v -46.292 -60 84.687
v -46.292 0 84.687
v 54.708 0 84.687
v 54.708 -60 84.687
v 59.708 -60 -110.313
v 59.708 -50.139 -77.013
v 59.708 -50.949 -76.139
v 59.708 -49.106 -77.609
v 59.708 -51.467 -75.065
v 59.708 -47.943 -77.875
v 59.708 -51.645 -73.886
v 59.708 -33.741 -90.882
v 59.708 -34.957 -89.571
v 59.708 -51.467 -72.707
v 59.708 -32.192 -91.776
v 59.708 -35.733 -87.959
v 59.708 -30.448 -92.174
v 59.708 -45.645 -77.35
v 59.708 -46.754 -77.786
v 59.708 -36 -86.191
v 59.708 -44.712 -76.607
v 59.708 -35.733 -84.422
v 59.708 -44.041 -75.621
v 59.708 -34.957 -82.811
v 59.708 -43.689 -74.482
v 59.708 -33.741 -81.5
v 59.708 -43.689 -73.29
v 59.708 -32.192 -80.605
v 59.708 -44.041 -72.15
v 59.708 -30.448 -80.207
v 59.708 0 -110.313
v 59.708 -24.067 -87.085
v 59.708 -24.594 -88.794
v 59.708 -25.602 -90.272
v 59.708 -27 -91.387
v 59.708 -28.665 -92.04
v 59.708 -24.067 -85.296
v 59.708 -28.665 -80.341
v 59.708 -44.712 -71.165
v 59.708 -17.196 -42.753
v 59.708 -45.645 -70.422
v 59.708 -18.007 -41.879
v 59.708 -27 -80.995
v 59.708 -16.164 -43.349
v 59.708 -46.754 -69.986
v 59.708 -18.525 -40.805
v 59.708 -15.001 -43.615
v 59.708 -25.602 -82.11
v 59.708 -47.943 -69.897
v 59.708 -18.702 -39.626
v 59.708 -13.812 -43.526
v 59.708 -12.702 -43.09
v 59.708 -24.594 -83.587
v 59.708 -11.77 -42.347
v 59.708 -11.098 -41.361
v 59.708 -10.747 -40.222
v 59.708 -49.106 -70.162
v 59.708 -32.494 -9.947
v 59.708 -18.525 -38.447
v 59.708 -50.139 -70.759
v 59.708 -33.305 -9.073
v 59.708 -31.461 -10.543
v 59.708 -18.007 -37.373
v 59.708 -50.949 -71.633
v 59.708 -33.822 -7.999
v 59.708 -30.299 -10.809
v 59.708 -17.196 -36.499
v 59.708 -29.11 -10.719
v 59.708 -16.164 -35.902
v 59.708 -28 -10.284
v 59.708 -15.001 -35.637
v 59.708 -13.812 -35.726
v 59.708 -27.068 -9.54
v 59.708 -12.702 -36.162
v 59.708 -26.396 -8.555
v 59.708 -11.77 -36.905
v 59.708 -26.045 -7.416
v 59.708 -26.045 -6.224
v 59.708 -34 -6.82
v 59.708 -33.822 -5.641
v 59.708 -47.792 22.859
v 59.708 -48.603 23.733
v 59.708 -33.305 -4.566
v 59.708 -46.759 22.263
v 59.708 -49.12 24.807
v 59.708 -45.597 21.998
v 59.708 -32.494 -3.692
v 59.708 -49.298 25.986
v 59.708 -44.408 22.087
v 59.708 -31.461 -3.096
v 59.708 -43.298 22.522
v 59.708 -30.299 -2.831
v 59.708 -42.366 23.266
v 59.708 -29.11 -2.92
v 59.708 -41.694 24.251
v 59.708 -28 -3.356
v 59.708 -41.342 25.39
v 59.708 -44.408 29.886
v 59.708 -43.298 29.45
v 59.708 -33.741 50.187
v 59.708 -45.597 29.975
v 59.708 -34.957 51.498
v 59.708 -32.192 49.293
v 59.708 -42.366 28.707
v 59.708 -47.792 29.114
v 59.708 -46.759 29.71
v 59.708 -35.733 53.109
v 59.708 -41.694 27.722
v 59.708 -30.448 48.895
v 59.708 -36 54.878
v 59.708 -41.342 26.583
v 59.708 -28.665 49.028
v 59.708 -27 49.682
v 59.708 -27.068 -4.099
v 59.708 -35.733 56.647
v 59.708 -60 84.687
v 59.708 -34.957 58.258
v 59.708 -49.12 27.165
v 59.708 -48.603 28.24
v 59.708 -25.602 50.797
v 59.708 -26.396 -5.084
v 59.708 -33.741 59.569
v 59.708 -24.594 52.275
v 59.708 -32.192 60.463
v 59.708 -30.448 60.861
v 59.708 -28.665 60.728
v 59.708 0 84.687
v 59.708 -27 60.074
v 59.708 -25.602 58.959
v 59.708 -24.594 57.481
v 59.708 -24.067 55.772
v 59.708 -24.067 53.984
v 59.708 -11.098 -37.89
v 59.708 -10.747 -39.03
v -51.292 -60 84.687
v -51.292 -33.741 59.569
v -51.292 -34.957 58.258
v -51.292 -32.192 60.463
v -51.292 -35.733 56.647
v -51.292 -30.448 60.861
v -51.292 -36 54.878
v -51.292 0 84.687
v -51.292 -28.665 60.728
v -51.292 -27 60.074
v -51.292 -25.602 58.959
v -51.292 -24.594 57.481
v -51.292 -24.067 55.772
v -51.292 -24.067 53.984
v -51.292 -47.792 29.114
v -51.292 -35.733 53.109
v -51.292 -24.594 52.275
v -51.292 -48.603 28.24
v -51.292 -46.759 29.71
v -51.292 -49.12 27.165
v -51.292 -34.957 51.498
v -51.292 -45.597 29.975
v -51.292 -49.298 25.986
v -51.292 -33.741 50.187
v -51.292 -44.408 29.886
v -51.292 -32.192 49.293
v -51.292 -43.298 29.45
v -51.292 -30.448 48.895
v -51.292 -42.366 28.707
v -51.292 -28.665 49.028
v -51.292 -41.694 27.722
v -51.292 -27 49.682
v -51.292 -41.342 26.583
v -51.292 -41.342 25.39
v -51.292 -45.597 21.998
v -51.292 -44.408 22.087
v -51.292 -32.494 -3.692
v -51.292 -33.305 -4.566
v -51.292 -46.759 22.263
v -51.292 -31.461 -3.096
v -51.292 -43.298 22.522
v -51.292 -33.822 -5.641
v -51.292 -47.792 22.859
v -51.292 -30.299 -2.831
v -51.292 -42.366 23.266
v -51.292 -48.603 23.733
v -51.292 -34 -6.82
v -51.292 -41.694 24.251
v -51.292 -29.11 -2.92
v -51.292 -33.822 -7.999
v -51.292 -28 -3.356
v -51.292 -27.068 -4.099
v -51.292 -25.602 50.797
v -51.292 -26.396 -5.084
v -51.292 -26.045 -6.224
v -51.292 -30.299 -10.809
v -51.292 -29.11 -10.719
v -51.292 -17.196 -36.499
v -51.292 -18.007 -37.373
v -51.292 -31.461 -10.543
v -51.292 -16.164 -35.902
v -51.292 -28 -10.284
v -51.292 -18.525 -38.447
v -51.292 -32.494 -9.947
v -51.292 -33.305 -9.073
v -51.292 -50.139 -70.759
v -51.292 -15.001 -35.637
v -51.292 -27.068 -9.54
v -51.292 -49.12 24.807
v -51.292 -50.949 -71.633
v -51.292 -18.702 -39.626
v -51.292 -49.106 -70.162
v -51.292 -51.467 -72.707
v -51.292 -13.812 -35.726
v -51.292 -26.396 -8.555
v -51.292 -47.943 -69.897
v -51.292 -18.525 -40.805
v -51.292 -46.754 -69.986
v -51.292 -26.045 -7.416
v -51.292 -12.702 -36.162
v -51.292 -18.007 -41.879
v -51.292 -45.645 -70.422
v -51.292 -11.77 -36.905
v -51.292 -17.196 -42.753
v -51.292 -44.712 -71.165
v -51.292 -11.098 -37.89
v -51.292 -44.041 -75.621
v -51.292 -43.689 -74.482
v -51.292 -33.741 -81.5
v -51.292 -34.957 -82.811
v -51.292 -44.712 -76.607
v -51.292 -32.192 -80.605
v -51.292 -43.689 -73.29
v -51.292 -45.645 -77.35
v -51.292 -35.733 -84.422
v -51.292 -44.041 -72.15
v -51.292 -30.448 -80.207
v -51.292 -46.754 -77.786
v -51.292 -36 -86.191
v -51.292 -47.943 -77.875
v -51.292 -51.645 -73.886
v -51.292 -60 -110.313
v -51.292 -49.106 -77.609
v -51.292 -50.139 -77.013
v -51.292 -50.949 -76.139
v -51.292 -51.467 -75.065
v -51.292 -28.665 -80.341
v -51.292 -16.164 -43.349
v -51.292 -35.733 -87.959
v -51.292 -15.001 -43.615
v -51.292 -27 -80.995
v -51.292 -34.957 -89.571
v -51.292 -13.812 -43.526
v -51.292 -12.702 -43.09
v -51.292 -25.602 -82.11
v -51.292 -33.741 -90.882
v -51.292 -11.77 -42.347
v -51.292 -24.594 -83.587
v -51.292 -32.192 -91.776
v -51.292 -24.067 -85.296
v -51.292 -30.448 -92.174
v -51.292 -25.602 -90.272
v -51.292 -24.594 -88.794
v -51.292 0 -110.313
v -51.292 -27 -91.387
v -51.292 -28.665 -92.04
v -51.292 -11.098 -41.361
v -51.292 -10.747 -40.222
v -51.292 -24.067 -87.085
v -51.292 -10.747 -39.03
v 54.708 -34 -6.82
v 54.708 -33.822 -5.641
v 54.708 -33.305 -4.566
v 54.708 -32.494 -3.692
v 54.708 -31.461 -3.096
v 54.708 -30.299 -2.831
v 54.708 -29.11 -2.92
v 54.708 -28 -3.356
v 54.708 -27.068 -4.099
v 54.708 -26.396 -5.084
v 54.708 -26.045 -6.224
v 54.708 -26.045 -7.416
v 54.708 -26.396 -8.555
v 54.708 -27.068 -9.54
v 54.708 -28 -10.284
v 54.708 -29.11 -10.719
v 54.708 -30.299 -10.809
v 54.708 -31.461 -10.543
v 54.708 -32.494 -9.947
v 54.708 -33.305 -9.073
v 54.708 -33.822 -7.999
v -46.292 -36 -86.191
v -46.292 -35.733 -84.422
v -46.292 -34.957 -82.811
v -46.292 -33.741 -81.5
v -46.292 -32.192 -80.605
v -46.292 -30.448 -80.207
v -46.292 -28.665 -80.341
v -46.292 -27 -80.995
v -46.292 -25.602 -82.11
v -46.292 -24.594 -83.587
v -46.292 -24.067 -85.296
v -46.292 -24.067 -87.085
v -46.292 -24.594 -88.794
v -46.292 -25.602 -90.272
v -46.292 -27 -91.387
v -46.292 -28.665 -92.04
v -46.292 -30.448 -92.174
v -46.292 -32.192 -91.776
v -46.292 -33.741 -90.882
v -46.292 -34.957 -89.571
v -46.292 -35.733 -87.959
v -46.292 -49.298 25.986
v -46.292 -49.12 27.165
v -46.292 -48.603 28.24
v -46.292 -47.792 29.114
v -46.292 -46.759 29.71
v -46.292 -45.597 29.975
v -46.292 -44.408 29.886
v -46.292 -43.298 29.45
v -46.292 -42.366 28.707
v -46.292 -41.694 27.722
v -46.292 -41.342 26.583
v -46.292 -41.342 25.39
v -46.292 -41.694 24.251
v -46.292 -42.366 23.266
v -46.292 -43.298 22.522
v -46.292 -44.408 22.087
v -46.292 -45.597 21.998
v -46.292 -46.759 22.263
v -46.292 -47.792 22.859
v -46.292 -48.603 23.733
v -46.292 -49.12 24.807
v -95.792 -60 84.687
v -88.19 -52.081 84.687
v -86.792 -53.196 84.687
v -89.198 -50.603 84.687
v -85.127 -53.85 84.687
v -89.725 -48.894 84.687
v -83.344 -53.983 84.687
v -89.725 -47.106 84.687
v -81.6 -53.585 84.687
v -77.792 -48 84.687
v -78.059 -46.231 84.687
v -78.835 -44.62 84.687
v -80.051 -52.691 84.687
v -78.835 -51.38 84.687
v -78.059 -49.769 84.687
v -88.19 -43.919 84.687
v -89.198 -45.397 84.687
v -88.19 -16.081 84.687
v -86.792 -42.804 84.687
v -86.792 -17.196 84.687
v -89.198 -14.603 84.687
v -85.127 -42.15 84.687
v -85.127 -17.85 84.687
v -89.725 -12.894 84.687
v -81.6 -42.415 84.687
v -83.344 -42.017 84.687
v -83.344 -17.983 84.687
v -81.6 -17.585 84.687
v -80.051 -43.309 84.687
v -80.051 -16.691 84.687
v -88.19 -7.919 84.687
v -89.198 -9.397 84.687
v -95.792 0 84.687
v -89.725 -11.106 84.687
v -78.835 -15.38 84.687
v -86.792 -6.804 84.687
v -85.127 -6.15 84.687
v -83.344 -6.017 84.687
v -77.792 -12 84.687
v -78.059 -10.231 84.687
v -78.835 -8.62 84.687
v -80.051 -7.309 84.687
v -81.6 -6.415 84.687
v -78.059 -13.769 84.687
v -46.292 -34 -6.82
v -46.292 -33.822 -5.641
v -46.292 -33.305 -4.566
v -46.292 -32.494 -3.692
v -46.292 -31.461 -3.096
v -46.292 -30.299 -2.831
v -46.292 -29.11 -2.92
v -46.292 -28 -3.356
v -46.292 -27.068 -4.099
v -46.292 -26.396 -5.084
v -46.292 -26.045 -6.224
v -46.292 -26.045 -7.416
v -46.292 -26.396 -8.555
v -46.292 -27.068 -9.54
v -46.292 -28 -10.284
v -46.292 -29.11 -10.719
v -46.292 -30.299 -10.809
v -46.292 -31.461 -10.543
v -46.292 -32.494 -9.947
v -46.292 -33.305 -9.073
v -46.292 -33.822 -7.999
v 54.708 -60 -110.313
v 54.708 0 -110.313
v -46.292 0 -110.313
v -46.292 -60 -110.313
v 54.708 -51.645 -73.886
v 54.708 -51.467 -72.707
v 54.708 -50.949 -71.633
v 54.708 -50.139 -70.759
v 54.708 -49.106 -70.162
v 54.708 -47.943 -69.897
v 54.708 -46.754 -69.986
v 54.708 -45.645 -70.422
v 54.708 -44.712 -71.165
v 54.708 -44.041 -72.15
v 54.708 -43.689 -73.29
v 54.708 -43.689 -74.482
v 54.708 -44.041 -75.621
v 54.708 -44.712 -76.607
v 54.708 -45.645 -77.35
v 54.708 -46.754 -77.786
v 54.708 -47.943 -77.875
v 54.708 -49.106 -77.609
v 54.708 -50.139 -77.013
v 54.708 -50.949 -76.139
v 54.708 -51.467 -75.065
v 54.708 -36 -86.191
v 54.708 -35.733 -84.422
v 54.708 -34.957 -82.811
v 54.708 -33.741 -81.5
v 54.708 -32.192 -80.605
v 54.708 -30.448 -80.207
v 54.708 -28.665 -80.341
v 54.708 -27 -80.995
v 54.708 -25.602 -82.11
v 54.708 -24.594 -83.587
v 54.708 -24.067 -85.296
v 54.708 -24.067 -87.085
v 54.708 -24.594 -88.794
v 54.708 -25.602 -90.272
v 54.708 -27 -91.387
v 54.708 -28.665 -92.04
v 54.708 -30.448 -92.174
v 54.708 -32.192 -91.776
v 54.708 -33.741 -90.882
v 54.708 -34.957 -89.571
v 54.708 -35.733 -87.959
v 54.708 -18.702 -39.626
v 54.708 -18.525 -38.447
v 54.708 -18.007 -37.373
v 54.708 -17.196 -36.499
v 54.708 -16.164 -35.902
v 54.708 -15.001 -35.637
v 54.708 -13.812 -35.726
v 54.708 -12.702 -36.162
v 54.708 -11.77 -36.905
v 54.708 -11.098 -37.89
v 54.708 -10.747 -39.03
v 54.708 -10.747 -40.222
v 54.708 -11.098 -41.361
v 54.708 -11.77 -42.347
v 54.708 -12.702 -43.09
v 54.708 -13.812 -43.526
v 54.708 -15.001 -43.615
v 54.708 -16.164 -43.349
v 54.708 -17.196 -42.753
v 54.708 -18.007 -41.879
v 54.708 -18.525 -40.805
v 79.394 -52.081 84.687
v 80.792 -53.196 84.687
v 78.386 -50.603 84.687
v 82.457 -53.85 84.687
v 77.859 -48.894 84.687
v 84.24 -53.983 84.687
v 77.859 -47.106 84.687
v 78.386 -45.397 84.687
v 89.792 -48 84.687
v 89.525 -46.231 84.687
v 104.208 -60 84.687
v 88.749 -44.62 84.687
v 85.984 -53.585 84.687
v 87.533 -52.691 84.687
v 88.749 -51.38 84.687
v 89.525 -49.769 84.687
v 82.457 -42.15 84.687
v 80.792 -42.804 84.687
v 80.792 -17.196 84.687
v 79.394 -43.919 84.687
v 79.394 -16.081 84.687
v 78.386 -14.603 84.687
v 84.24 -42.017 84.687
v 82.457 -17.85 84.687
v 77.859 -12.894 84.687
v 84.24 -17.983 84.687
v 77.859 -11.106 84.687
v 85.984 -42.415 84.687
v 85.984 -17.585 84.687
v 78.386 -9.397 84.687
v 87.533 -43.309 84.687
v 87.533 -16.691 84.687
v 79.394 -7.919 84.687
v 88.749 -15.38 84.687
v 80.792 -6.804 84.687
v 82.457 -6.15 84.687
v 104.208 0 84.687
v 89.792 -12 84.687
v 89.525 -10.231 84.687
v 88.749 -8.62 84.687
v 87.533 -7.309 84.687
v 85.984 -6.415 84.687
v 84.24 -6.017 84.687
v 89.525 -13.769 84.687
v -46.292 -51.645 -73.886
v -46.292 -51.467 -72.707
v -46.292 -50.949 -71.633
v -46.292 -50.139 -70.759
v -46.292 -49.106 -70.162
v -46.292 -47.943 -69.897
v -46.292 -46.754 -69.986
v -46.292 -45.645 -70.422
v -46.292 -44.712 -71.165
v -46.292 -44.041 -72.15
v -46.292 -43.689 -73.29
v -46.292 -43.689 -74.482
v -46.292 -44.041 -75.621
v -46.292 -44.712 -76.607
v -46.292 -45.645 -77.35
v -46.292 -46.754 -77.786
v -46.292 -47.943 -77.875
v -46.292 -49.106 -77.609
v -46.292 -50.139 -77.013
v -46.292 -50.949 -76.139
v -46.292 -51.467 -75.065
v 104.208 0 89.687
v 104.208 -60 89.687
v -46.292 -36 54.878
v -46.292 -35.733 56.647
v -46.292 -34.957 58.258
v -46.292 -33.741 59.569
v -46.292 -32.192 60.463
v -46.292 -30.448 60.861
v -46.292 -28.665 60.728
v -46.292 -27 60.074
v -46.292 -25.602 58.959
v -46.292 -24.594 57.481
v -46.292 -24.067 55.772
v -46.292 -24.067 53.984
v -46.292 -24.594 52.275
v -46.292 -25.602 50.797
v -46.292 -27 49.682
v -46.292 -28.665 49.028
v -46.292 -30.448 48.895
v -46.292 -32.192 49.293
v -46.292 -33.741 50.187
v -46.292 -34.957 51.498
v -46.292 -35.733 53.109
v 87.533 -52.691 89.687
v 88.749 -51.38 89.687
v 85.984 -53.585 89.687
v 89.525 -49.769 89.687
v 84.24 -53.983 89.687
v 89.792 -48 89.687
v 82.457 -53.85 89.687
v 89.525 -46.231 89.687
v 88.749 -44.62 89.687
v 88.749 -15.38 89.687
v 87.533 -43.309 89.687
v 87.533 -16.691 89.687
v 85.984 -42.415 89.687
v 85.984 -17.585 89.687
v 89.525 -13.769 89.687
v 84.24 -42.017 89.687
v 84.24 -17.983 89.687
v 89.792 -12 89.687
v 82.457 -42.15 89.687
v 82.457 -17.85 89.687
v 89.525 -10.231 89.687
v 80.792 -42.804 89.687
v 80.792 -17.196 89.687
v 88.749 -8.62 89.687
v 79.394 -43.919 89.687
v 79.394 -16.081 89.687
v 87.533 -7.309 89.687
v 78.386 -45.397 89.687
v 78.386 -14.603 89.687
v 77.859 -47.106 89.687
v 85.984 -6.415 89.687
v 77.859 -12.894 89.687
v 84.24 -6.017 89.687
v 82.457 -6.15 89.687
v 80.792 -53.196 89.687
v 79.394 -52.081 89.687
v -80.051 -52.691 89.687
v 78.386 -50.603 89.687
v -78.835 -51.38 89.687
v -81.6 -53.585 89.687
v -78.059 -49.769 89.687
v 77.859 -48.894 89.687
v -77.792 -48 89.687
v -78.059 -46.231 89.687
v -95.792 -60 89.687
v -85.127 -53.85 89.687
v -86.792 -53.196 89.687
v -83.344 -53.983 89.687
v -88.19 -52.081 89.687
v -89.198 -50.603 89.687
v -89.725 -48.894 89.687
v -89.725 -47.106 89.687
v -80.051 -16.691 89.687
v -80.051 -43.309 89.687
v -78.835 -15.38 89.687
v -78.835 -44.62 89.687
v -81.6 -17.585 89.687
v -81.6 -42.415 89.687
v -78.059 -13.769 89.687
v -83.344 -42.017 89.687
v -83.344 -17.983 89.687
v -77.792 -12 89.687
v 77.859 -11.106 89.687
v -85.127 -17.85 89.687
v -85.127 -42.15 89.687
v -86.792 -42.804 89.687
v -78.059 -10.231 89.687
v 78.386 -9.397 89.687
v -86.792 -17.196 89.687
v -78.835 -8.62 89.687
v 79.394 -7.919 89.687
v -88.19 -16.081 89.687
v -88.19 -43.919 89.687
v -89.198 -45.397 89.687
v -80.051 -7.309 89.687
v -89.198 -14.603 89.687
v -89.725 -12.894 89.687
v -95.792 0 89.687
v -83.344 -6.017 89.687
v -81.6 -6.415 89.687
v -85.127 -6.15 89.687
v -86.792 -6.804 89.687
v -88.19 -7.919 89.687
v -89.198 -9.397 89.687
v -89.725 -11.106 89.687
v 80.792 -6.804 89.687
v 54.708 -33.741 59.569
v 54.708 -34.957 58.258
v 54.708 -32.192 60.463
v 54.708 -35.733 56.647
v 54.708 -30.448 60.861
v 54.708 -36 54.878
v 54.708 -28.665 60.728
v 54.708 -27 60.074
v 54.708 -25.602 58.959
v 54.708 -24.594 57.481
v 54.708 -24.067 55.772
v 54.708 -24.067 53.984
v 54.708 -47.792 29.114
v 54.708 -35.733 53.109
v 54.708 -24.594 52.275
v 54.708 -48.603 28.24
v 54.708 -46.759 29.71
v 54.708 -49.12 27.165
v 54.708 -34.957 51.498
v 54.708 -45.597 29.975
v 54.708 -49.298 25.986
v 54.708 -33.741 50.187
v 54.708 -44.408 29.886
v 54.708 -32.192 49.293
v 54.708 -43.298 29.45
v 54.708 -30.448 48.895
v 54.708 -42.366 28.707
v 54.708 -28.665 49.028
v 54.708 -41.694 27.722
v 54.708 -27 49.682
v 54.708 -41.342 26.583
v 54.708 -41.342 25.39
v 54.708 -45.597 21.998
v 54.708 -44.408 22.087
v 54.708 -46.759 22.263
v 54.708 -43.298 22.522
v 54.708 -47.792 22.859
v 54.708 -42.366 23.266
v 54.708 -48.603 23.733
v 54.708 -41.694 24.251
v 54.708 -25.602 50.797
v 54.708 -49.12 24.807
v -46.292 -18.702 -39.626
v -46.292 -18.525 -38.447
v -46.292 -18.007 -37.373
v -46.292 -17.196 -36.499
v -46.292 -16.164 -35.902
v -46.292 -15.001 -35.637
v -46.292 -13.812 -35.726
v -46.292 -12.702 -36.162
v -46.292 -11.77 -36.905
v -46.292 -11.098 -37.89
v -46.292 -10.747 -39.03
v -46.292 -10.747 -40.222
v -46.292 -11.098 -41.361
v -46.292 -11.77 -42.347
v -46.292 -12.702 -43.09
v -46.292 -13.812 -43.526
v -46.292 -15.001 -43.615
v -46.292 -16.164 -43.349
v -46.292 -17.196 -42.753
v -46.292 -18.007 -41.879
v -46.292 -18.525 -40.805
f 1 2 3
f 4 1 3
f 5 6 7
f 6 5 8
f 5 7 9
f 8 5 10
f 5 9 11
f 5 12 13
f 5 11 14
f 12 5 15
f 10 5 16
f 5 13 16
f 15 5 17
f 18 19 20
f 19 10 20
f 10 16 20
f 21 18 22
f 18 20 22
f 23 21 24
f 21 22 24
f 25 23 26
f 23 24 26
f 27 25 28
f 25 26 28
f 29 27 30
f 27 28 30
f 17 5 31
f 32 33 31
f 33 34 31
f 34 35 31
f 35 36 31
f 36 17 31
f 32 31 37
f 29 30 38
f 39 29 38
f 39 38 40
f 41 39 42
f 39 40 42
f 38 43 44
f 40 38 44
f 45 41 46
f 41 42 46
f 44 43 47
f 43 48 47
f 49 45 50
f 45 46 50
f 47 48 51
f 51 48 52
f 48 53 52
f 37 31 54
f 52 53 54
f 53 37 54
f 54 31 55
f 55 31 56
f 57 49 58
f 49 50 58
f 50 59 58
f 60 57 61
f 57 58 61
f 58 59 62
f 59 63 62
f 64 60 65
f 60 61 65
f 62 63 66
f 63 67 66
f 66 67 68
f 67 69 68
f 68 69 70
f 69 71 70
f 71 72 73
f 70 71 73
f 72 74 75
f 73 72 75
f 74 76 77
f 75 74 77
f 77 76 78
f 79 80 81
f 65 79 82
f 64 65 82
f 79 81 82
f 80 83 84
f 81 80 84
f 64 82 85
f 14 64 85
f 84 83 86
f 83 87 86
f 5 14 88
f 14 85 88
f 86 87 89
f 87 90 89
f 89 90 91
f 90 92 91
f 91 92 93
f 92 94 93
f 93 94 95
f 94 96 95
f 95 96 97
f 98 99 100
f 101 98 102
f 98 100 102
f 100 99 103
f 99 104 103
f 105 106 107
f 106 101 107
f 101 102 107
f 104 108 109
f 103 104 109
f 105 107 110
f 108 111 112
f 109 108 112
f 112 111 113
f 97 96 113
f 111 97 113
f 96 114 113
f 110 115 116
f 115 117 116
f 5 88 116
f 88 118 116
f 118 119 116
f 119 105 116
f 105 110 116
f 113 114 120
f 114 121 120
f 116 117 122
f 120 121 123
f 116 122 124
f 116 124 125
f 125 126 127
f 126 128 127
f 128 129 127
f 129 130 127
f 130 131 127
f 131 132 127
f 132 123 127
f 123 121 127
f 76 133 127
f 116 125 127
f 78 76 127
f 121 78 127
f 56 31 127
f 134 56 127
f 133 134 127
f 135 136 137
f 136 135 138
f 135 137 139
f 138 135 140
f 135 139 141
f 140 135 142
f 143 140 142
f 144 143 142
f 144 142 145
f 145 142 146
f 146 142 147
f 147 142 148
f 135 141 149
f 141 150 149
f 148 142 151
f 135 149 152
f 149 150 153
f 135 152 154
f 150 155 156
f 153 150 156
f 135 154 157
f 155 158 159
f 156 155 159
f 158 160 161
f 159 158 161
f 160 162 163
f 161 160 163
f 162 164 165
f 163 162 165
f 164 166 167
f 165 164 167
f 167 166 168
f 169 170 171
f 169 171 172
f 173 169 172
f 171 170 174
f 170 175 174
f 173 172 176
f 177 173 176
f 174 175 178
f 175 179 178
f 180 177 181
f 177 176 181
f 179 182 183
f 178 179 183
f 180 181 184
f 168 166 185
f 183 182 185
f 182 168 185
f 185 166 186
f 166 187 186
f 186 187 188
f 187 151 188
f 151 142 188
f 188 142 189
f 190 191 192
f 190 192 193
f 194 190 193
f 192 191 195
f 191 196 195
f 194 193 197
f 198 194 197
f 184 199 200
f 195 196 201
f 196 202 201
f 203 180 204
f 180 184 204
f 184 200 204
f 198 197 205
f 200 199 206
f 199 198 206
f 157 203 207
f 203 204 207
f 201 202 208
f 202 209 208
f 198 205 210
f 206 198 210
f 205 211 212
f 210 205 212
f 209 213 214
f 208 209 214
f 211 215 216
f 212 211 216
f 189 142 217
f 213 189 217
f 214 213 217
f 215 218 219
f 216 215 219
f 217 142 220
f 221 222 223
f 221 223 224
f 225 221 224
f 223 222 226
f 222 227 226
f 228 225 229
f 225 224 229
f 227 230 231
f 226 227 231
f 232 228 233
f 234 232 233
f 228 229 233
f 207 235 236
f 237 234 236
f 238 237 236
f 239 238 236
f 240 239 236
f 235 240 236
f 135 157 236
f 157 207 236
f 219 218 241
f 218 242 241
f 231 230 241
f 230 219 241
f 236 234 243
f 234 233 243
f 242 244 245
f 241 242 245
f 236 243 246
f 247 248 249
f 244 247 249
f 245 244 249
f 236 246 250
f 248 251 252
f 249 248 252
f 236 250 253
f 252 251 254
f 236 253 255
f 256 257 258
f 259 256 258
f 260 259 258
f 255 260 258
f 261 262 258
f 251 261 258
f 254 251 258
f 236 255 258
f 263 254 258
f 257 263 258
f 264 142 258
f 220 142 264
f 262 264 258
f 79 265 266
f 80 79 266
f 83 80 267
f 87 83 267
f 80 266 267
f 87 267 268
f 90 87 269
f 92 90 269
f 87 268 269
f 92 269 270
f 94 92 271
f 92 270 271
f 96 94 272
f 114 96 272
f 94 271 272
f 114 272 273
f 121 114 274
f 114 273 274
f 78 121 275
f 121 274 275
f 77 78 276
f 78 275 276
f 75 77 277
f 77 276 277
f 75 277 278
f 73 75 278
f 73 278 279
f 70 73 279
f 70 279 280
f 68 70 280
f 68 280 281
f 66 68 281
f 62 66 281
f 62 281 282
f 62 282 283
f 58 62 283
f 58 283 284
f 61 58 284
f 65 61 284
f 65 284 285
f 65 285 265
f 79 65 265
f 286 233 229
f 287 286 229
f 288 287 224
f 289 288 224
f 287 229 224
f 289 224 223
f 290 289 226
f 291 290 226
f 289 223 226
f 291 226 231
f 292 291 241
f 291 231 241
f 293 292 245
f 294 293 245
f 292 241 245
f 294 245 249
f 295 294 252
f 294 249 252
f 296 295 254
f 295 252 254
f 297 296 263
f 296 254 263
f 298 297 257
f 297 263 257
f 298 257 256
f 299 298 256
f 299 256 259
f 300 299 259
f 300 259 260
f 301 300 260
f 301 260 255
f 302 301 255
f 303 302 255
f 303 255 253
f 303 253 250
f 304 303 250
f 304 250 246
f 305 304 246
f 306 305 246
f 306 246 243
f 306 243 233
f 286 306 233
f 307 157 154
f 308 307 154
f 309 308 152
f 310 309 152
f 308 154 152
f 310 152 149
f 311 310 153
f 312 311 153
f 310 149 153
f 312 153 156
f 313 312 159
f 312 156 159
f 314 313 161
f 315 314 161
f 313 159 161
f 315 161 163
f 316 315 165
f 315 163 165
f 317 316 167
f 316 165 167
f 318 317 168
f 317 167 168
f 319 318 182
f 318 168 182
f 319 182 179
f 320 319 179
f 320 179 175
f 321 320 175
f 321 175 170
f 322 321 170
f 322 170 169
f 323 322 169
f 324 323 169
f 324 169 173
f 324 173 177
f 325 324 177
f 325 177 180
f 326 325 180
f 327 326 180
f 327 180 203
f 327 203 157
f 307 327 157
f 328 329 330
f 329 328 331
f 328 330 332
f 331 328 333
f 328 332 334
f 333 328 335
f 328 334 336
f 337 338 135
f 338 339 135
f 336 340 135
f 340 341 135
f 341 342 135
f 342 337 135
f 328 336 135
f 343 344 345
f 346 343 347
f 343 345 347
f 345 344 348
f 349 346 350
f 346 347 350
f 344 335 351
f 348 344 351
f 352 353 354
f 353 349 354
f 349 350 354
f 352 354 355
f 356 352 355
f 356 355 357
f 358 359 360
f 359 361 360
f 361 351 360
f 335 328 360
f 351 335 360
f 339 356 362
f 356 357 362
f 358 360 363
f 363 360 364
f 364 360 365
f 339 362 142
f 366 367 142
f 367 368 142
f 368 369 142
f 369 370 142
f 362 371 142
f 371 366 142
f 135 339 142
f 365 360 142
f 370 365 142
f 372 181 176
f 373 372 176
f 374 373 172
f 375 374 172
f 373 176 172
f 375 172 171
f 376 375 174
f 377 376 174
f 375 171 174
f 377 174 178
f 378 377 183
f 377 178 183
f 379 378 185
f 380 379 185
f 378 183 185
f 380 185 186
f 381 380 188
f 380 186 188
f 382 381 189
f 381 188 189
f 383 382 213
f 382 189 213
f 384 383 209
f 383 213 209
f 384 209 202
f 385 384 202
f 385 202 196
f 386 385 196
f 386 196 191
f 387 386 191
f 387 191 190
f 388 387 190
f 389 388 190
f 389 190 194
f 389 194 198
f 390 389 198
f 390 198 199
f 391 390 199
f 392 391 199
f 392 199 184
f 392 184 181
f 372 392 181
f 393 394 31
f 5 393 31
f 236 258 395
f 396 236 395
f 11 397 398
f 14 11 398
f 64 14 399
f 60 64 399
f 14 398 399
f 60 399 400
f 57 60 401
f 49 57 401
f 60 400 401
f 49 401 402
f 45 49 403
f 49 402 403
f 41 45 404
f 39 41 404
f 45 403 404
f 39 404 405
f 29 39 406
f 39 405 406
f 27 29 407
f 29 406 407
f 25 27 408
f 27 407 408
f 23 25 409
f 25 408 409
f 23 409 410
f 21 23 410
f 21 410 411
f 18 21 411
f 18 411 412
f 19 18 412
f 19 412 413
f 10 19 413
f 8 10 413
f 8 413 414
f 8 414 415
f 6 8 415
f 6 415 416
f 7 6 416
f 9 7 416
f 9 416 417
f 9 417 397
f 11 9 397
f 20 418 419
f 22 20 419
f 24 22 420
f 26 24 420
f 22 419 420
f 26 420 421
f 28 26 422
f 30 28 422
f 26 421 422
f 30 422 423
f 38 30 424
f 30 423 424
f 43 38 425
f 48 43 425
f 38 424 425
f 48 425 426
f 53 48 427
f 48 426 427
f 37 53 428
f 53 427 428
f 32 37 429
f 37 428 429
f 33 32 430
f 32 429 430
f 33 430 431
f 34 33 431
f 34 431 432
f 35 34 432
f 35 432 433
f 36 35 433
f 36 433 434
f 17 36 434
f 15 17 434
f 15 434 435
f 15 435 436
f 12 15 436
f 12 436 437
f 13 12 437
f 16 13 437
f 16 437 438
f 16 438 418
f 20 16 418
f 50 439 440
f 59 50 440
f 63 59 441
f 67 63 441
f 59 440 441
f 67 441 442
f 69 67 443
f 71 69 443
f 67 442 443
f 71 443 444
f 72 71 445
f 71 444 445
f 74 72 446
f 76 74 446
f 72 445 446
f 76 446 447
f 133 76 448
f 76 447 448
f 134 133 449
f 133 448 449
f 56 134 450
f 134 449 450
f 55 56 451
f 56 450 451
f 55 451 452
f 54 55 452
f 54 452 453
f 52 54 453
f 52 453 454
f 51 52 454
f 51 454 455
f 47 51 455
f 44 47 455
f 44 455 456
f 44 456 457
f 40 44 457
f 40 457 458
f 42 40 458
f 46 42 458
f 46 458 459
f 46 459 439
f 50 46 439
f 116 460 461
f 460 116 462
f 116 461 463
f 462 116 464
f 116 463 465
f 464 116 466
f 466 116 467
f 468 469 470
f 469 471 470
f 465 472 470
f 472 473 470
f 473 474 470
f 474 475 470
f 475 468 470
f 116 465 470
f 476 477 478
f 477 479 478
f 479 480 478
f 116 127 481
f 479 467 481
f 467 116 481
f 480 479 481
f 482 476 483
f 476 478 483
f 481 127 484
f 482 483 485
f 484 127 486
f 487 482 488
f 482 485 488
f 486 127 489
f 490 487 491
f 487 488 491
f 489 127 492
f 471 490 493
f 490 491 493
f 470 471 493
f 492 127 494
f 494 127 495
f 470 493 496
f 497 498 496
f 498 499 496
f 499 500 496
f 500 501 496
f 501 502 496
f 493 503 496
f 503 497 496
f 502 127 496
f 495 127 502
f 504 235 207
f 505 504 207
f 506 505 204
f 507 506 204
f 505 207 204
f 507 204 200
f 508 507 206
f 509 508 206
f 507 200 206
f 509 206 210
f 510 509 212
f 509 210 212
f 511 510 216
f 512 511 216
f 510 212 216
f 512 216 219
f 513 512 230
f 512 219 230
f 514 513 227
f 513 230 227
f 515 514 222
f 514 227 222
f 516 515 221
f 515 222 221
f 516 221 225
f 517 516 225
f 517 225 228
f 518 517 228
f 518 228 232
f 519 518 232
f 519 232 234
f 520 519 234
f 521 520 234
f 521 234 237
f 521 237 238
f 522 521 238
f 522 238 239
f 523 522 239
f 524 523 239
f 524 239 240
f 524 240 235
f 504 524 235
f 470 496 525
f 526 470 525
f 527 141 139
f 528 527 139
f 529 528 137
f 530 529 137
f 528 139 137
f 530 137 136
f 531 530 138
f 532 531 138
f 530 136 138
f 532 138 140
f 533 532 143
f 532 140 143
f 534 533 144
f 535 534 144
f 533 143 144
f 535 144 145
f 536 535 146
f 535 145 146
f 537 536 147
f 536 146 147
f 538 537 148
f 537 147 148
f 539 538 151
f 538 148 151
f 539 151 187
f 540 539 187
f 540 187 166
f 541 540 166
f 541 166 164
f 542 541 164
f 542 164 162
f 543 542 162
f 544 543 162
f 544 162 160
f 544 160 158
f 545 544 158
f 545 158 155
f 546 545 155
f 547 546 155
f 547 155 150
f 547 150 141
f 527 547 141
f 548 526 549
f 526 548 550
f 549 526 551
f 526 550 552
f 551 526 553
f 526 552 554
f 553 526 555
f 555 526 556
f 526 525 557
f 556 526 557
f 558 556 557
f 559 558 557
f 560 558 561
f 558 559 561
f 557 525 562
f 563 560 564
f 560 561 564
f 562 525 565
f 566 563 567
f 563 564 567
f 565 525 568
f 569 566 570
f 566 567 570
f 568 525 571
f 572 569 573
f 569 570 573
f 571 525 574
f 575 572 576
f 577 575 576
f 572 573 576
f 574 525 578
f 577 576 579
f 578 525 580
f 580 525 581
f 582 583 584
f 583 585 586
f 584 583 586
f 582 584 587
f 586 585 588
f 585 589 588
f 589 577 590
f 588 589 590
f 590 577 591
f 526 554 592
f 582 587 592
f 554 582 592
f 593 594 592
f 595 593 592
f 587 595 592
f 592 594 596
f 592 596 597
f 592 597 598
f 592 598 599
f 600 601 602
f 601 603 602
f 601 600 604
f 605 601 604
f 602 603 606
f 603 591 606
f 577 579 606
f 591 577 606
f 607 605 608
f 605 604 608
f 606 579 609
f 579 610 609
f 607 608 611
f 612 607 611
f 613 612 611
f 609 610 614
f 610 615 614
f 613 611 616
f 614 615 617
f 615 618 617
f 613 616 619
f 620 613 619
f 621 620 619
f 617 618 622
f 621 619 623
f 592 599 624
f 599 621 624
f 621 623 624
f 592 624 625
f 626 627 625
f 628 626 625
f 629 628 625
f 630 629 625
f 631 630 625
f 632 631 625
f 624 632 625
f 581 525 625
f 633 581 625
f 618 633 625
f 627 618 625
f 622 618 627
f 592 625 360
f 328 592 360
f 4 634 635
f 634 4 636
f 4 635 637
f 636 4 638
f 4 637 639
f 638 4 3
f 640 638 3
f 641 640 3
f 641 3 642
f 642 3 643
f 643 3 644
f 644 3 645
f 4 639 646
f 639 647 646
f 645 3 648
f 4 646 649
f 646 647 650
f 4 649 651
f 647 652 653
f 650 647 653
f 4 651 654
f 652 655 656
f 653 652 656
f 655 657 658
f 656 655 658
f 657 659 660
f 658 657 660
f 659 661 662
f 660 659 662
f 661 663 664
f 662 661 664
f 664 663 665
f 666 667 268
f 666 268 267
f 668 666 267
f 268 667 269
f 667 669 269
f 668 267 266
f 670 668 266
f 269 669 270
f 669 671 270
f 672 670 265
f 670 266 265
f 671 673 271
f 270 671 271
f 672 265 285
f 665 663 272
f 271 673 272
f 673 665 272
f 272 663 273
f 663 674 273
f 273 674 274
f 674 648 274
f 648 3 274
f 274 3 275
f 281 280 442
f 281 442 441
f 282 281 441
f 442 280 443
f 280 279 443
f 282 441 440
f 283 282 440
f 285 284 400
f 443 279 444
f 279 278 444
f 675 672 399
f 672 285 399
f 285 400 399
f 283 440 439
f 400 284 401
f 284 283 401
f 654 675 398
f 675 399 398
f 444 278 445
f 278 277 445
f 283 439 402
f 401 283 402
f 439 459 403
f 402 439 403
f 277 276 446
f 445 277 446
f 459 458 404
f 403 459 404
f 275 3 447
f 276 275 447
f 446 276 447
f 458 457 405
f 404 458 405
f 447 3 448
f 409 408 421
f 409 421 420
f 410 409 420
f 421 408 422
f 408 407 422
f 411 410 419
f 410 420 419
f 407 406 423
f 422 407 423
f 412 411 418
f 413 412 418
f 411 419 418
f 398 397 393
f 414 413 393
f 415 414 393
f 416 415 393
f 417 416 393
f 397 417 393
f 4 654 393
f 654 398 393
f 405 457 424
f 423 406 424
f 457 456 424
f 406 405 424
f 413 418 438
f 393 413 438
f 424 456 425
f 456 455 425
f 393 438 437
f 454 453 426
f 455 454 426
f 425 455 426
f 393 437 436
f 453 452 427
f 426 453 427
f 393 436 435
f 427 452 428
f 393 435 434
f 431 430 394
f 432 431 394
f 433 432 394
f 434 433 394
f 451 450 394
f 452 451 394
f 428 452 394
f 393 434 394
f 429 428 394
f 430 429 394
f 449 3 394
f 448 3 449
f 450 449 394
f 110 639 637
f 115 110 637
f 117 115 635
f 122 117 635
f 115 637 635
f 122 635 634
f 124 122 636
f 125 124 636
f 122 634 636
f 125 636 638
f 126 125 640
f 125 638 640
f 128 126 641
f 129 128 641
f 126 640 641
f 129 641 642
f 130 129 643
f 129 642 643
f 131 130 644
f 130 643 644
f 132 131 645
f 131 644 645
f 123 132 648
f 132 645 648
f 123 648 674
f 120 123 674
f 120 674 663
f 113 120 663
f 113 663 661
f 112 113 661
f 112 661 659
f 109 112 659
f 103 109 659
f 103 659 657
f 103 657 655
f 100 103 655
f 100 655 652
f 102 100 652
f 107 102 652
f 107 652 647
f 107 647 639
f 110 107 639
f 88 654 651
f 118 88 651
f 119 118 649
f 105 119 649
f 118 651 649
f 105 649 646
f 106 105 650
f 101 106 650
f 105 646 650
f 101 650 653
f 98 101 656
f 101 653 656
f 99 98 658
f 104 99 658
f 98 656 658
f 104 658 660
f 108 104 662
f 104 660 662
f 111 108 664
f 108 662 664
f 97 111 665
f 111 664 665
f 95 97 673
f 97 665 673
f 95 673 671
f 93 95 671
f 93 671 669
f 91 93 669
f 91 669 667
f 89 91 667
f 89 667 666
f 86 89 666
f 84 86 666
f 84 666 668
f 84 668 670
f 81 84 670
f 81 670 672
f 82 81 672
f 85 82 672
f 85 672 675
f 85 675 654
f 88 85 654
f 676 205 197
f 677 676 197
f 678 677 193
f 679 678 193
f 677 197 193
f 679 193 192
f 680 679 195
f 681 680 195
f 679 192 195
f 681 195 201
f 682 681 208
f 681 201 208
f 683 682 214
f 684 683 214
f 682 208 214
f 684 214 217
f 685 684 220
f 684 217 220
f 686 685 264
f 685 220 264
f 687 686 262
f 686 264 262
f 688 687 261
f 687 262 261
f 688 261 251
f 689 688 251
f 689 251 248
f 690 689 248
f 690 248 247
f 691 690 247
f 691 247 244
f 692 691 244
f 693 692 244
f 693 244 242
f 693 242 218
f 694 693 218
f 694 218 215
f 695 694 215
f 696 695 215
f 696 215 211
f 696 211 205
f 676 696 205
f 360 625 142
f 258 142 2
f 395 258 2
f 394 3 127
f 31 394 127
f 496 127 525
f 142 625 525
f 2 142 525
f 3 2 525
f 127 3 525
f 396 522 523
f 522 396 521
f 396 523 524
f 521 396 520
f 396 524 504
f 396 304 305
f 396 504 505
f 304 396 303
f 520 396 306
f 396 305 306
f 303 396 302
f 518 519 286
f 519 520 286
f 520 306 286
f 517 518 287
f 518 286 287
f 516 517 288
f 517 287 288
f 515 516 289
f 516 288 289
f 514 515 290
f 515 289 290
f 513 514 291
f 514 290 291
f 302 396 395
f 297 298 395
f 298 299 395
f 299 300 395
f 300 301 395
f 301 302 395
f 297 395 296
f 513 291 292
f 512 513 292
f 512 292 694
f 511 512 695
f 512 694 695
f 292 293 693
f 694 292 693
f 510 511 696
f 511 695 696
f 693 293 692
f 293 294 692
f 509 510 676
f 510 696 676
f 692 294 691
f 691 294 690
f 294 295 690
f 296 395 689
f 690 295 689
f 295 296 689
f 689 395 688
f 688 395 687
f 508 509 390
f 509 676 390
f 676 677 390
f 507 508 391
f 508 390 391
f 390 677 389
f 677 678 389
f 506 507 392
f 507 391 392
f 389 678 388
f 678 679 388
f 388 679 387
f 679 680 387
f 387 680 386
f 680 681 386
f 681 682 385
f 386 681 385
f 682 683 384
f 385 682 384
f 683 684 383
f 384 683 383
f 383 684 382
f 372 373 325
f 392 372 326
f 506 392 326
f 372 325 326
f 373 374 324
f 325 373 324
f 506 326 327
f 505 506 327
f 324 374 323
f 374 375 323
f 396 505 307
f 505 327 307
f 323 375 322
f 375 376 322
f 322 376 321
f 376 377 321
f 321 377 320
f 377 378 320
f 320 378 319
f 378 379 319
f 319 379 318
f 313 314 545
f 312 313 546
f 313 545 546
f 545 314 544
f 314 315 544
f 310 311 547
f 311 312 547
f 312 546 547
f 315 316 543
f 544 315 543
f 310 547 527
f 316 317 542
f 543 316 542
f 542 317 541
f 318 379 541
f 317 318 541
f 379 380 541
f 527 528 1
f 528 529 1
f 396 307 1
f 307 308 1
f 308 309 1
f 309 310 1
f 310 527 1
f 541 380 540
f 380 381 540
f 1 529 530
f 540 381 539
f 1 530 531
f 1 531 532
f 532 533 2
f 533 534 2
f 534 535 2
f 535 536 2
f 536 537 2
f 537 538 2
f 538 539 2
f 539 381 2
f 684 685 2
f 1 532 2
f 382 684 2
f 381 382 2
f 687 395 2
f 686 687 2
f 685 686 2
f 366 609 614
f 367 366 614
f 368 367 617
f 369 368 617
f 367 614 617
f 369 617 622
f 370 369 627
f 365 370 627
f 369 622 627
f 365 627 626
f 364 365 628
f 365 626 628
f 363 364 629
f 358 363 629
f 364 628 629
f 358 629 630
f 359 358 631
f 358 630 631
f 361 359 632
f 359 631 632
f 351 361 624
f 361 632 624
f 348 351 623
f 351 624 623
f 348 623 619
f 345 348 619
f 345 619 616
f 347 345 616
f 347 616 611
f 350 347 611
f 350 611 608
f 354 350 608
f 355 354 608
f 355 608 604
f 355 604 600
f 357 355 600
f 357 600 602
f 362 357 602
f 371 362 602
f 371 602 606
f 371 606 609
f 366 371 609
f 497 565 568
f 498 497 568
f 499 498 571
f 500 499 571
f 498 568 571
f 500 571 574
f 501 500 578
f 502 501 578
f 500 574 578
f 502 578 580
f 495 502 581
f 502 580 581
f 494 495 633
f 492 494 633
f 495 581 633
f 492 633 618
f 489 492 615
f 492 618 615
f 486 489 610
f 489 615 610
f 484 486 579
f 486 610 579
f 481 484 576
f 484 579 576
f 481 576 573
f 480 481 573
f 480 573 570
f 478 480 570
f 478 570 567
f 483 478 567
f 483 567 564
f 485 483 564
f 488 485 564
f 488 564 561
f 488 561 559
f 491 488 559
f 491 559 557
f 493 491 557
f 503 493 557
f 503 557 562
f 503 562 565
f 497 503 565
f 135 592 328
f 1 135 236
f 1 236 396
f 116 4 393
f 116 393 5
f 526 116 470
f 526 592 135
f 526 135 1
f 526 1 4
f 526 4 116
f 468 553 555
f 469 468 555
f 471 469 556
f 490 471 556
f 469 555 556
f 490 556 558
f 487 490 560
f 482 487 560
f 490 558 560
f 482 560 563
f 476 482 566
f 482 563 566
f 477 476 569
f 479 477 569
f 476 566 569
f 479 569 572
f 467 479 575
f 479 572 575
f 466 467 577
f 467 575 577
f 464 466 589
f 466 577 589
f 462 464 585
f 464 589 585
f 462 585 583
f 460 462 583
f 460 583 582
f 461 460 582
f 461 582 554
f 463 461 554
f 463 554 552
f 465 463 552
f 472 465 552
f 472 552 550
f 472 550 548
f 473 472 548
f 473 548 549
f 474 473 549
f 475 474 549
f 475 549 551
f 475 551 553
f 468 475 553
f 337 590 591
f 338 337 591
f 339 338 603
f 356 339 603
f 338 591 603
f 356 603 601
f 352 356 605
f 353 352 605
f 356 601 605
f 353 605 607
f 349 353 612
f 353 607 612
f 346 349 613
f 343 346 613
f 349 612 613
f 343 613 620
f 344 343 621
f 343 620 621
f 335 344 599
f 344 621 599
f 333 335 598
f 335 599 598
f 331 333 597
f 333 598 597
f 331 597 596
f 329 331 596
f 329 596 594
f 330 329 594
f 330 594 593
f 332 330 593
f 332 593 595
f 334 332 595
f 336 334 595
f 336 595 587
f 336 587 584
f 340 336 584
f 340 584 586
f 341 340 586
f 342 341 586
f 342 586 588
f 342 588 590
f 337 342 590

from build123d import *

# Parameters (mm, degrees)
F1_DEPTH = 60
F2_R     = 6
F3_DEPTH = 25
F4_R     = 6
F4_R_2   = 4
F5_DEPTH = 155.501


with BuildPart() as f1:
    # F0 (on Front) → F1 (new body)
    with BuildSketch(Plane.XZ):
        Polygon((104.208015, 89.68718), (-95.791985, 89.68718), (-95.791985, 84.68718), (-51.291985, 84.68718), (-51.291985, -110.31282), (-46.291985, -110.31282), (-46.291985, 84.68718), (54.708015, 84.68718), (54.708015, -110.31282), (59.708015, -110.31282), (59.708015, 84.68718), (104.208015, 84.68718), align=None)
    extrude(amount=F1_DEPTH)

    # F2 (on face) → F3 (cut)
    with BuildSketch(Plane.XY.offset(89.68718)):
        with Locations((-83.791985, -12)):
            Circle(F2_R)
        with Locations((83.791985, -12)):
            Circle(F2_R)
        with Locations((-83.791985, -48)):
            Circle(F2_R)
        with Locations((83.791985, -48)):
            Circle(F2_R)
    extrude(amount=-F3_DEPTH, mode=Mode.SUBTRACT)

    # F4 (on face) → F5 (cut, through all)
    with BuildSketch(Plane(origin=(-51.291985, 0, 0), x_dir=(0, -1, 0), z_dir=(-1, 0, 0))):
        with Locations((30, 54.878019)):
            Circle(F4_R)
        with Locations((30, -86.190678)):
            Circle(F4_R)
        with Locations((30, -6.819744)):
            Circle(F4_R_2)
        with Locations((14.702255, -39.625864)):
            Circle(F4_R_2)
        with Locations((45.297745, 25.986376)):
            Circle(F4_R_2)
        with Locations((47.644541, -73.885843)):
            Circle(F4_R_2)
    extrude(amount=-F5_DEPTH, mode=Mode.SUBTRACT)


solid = f1.part
